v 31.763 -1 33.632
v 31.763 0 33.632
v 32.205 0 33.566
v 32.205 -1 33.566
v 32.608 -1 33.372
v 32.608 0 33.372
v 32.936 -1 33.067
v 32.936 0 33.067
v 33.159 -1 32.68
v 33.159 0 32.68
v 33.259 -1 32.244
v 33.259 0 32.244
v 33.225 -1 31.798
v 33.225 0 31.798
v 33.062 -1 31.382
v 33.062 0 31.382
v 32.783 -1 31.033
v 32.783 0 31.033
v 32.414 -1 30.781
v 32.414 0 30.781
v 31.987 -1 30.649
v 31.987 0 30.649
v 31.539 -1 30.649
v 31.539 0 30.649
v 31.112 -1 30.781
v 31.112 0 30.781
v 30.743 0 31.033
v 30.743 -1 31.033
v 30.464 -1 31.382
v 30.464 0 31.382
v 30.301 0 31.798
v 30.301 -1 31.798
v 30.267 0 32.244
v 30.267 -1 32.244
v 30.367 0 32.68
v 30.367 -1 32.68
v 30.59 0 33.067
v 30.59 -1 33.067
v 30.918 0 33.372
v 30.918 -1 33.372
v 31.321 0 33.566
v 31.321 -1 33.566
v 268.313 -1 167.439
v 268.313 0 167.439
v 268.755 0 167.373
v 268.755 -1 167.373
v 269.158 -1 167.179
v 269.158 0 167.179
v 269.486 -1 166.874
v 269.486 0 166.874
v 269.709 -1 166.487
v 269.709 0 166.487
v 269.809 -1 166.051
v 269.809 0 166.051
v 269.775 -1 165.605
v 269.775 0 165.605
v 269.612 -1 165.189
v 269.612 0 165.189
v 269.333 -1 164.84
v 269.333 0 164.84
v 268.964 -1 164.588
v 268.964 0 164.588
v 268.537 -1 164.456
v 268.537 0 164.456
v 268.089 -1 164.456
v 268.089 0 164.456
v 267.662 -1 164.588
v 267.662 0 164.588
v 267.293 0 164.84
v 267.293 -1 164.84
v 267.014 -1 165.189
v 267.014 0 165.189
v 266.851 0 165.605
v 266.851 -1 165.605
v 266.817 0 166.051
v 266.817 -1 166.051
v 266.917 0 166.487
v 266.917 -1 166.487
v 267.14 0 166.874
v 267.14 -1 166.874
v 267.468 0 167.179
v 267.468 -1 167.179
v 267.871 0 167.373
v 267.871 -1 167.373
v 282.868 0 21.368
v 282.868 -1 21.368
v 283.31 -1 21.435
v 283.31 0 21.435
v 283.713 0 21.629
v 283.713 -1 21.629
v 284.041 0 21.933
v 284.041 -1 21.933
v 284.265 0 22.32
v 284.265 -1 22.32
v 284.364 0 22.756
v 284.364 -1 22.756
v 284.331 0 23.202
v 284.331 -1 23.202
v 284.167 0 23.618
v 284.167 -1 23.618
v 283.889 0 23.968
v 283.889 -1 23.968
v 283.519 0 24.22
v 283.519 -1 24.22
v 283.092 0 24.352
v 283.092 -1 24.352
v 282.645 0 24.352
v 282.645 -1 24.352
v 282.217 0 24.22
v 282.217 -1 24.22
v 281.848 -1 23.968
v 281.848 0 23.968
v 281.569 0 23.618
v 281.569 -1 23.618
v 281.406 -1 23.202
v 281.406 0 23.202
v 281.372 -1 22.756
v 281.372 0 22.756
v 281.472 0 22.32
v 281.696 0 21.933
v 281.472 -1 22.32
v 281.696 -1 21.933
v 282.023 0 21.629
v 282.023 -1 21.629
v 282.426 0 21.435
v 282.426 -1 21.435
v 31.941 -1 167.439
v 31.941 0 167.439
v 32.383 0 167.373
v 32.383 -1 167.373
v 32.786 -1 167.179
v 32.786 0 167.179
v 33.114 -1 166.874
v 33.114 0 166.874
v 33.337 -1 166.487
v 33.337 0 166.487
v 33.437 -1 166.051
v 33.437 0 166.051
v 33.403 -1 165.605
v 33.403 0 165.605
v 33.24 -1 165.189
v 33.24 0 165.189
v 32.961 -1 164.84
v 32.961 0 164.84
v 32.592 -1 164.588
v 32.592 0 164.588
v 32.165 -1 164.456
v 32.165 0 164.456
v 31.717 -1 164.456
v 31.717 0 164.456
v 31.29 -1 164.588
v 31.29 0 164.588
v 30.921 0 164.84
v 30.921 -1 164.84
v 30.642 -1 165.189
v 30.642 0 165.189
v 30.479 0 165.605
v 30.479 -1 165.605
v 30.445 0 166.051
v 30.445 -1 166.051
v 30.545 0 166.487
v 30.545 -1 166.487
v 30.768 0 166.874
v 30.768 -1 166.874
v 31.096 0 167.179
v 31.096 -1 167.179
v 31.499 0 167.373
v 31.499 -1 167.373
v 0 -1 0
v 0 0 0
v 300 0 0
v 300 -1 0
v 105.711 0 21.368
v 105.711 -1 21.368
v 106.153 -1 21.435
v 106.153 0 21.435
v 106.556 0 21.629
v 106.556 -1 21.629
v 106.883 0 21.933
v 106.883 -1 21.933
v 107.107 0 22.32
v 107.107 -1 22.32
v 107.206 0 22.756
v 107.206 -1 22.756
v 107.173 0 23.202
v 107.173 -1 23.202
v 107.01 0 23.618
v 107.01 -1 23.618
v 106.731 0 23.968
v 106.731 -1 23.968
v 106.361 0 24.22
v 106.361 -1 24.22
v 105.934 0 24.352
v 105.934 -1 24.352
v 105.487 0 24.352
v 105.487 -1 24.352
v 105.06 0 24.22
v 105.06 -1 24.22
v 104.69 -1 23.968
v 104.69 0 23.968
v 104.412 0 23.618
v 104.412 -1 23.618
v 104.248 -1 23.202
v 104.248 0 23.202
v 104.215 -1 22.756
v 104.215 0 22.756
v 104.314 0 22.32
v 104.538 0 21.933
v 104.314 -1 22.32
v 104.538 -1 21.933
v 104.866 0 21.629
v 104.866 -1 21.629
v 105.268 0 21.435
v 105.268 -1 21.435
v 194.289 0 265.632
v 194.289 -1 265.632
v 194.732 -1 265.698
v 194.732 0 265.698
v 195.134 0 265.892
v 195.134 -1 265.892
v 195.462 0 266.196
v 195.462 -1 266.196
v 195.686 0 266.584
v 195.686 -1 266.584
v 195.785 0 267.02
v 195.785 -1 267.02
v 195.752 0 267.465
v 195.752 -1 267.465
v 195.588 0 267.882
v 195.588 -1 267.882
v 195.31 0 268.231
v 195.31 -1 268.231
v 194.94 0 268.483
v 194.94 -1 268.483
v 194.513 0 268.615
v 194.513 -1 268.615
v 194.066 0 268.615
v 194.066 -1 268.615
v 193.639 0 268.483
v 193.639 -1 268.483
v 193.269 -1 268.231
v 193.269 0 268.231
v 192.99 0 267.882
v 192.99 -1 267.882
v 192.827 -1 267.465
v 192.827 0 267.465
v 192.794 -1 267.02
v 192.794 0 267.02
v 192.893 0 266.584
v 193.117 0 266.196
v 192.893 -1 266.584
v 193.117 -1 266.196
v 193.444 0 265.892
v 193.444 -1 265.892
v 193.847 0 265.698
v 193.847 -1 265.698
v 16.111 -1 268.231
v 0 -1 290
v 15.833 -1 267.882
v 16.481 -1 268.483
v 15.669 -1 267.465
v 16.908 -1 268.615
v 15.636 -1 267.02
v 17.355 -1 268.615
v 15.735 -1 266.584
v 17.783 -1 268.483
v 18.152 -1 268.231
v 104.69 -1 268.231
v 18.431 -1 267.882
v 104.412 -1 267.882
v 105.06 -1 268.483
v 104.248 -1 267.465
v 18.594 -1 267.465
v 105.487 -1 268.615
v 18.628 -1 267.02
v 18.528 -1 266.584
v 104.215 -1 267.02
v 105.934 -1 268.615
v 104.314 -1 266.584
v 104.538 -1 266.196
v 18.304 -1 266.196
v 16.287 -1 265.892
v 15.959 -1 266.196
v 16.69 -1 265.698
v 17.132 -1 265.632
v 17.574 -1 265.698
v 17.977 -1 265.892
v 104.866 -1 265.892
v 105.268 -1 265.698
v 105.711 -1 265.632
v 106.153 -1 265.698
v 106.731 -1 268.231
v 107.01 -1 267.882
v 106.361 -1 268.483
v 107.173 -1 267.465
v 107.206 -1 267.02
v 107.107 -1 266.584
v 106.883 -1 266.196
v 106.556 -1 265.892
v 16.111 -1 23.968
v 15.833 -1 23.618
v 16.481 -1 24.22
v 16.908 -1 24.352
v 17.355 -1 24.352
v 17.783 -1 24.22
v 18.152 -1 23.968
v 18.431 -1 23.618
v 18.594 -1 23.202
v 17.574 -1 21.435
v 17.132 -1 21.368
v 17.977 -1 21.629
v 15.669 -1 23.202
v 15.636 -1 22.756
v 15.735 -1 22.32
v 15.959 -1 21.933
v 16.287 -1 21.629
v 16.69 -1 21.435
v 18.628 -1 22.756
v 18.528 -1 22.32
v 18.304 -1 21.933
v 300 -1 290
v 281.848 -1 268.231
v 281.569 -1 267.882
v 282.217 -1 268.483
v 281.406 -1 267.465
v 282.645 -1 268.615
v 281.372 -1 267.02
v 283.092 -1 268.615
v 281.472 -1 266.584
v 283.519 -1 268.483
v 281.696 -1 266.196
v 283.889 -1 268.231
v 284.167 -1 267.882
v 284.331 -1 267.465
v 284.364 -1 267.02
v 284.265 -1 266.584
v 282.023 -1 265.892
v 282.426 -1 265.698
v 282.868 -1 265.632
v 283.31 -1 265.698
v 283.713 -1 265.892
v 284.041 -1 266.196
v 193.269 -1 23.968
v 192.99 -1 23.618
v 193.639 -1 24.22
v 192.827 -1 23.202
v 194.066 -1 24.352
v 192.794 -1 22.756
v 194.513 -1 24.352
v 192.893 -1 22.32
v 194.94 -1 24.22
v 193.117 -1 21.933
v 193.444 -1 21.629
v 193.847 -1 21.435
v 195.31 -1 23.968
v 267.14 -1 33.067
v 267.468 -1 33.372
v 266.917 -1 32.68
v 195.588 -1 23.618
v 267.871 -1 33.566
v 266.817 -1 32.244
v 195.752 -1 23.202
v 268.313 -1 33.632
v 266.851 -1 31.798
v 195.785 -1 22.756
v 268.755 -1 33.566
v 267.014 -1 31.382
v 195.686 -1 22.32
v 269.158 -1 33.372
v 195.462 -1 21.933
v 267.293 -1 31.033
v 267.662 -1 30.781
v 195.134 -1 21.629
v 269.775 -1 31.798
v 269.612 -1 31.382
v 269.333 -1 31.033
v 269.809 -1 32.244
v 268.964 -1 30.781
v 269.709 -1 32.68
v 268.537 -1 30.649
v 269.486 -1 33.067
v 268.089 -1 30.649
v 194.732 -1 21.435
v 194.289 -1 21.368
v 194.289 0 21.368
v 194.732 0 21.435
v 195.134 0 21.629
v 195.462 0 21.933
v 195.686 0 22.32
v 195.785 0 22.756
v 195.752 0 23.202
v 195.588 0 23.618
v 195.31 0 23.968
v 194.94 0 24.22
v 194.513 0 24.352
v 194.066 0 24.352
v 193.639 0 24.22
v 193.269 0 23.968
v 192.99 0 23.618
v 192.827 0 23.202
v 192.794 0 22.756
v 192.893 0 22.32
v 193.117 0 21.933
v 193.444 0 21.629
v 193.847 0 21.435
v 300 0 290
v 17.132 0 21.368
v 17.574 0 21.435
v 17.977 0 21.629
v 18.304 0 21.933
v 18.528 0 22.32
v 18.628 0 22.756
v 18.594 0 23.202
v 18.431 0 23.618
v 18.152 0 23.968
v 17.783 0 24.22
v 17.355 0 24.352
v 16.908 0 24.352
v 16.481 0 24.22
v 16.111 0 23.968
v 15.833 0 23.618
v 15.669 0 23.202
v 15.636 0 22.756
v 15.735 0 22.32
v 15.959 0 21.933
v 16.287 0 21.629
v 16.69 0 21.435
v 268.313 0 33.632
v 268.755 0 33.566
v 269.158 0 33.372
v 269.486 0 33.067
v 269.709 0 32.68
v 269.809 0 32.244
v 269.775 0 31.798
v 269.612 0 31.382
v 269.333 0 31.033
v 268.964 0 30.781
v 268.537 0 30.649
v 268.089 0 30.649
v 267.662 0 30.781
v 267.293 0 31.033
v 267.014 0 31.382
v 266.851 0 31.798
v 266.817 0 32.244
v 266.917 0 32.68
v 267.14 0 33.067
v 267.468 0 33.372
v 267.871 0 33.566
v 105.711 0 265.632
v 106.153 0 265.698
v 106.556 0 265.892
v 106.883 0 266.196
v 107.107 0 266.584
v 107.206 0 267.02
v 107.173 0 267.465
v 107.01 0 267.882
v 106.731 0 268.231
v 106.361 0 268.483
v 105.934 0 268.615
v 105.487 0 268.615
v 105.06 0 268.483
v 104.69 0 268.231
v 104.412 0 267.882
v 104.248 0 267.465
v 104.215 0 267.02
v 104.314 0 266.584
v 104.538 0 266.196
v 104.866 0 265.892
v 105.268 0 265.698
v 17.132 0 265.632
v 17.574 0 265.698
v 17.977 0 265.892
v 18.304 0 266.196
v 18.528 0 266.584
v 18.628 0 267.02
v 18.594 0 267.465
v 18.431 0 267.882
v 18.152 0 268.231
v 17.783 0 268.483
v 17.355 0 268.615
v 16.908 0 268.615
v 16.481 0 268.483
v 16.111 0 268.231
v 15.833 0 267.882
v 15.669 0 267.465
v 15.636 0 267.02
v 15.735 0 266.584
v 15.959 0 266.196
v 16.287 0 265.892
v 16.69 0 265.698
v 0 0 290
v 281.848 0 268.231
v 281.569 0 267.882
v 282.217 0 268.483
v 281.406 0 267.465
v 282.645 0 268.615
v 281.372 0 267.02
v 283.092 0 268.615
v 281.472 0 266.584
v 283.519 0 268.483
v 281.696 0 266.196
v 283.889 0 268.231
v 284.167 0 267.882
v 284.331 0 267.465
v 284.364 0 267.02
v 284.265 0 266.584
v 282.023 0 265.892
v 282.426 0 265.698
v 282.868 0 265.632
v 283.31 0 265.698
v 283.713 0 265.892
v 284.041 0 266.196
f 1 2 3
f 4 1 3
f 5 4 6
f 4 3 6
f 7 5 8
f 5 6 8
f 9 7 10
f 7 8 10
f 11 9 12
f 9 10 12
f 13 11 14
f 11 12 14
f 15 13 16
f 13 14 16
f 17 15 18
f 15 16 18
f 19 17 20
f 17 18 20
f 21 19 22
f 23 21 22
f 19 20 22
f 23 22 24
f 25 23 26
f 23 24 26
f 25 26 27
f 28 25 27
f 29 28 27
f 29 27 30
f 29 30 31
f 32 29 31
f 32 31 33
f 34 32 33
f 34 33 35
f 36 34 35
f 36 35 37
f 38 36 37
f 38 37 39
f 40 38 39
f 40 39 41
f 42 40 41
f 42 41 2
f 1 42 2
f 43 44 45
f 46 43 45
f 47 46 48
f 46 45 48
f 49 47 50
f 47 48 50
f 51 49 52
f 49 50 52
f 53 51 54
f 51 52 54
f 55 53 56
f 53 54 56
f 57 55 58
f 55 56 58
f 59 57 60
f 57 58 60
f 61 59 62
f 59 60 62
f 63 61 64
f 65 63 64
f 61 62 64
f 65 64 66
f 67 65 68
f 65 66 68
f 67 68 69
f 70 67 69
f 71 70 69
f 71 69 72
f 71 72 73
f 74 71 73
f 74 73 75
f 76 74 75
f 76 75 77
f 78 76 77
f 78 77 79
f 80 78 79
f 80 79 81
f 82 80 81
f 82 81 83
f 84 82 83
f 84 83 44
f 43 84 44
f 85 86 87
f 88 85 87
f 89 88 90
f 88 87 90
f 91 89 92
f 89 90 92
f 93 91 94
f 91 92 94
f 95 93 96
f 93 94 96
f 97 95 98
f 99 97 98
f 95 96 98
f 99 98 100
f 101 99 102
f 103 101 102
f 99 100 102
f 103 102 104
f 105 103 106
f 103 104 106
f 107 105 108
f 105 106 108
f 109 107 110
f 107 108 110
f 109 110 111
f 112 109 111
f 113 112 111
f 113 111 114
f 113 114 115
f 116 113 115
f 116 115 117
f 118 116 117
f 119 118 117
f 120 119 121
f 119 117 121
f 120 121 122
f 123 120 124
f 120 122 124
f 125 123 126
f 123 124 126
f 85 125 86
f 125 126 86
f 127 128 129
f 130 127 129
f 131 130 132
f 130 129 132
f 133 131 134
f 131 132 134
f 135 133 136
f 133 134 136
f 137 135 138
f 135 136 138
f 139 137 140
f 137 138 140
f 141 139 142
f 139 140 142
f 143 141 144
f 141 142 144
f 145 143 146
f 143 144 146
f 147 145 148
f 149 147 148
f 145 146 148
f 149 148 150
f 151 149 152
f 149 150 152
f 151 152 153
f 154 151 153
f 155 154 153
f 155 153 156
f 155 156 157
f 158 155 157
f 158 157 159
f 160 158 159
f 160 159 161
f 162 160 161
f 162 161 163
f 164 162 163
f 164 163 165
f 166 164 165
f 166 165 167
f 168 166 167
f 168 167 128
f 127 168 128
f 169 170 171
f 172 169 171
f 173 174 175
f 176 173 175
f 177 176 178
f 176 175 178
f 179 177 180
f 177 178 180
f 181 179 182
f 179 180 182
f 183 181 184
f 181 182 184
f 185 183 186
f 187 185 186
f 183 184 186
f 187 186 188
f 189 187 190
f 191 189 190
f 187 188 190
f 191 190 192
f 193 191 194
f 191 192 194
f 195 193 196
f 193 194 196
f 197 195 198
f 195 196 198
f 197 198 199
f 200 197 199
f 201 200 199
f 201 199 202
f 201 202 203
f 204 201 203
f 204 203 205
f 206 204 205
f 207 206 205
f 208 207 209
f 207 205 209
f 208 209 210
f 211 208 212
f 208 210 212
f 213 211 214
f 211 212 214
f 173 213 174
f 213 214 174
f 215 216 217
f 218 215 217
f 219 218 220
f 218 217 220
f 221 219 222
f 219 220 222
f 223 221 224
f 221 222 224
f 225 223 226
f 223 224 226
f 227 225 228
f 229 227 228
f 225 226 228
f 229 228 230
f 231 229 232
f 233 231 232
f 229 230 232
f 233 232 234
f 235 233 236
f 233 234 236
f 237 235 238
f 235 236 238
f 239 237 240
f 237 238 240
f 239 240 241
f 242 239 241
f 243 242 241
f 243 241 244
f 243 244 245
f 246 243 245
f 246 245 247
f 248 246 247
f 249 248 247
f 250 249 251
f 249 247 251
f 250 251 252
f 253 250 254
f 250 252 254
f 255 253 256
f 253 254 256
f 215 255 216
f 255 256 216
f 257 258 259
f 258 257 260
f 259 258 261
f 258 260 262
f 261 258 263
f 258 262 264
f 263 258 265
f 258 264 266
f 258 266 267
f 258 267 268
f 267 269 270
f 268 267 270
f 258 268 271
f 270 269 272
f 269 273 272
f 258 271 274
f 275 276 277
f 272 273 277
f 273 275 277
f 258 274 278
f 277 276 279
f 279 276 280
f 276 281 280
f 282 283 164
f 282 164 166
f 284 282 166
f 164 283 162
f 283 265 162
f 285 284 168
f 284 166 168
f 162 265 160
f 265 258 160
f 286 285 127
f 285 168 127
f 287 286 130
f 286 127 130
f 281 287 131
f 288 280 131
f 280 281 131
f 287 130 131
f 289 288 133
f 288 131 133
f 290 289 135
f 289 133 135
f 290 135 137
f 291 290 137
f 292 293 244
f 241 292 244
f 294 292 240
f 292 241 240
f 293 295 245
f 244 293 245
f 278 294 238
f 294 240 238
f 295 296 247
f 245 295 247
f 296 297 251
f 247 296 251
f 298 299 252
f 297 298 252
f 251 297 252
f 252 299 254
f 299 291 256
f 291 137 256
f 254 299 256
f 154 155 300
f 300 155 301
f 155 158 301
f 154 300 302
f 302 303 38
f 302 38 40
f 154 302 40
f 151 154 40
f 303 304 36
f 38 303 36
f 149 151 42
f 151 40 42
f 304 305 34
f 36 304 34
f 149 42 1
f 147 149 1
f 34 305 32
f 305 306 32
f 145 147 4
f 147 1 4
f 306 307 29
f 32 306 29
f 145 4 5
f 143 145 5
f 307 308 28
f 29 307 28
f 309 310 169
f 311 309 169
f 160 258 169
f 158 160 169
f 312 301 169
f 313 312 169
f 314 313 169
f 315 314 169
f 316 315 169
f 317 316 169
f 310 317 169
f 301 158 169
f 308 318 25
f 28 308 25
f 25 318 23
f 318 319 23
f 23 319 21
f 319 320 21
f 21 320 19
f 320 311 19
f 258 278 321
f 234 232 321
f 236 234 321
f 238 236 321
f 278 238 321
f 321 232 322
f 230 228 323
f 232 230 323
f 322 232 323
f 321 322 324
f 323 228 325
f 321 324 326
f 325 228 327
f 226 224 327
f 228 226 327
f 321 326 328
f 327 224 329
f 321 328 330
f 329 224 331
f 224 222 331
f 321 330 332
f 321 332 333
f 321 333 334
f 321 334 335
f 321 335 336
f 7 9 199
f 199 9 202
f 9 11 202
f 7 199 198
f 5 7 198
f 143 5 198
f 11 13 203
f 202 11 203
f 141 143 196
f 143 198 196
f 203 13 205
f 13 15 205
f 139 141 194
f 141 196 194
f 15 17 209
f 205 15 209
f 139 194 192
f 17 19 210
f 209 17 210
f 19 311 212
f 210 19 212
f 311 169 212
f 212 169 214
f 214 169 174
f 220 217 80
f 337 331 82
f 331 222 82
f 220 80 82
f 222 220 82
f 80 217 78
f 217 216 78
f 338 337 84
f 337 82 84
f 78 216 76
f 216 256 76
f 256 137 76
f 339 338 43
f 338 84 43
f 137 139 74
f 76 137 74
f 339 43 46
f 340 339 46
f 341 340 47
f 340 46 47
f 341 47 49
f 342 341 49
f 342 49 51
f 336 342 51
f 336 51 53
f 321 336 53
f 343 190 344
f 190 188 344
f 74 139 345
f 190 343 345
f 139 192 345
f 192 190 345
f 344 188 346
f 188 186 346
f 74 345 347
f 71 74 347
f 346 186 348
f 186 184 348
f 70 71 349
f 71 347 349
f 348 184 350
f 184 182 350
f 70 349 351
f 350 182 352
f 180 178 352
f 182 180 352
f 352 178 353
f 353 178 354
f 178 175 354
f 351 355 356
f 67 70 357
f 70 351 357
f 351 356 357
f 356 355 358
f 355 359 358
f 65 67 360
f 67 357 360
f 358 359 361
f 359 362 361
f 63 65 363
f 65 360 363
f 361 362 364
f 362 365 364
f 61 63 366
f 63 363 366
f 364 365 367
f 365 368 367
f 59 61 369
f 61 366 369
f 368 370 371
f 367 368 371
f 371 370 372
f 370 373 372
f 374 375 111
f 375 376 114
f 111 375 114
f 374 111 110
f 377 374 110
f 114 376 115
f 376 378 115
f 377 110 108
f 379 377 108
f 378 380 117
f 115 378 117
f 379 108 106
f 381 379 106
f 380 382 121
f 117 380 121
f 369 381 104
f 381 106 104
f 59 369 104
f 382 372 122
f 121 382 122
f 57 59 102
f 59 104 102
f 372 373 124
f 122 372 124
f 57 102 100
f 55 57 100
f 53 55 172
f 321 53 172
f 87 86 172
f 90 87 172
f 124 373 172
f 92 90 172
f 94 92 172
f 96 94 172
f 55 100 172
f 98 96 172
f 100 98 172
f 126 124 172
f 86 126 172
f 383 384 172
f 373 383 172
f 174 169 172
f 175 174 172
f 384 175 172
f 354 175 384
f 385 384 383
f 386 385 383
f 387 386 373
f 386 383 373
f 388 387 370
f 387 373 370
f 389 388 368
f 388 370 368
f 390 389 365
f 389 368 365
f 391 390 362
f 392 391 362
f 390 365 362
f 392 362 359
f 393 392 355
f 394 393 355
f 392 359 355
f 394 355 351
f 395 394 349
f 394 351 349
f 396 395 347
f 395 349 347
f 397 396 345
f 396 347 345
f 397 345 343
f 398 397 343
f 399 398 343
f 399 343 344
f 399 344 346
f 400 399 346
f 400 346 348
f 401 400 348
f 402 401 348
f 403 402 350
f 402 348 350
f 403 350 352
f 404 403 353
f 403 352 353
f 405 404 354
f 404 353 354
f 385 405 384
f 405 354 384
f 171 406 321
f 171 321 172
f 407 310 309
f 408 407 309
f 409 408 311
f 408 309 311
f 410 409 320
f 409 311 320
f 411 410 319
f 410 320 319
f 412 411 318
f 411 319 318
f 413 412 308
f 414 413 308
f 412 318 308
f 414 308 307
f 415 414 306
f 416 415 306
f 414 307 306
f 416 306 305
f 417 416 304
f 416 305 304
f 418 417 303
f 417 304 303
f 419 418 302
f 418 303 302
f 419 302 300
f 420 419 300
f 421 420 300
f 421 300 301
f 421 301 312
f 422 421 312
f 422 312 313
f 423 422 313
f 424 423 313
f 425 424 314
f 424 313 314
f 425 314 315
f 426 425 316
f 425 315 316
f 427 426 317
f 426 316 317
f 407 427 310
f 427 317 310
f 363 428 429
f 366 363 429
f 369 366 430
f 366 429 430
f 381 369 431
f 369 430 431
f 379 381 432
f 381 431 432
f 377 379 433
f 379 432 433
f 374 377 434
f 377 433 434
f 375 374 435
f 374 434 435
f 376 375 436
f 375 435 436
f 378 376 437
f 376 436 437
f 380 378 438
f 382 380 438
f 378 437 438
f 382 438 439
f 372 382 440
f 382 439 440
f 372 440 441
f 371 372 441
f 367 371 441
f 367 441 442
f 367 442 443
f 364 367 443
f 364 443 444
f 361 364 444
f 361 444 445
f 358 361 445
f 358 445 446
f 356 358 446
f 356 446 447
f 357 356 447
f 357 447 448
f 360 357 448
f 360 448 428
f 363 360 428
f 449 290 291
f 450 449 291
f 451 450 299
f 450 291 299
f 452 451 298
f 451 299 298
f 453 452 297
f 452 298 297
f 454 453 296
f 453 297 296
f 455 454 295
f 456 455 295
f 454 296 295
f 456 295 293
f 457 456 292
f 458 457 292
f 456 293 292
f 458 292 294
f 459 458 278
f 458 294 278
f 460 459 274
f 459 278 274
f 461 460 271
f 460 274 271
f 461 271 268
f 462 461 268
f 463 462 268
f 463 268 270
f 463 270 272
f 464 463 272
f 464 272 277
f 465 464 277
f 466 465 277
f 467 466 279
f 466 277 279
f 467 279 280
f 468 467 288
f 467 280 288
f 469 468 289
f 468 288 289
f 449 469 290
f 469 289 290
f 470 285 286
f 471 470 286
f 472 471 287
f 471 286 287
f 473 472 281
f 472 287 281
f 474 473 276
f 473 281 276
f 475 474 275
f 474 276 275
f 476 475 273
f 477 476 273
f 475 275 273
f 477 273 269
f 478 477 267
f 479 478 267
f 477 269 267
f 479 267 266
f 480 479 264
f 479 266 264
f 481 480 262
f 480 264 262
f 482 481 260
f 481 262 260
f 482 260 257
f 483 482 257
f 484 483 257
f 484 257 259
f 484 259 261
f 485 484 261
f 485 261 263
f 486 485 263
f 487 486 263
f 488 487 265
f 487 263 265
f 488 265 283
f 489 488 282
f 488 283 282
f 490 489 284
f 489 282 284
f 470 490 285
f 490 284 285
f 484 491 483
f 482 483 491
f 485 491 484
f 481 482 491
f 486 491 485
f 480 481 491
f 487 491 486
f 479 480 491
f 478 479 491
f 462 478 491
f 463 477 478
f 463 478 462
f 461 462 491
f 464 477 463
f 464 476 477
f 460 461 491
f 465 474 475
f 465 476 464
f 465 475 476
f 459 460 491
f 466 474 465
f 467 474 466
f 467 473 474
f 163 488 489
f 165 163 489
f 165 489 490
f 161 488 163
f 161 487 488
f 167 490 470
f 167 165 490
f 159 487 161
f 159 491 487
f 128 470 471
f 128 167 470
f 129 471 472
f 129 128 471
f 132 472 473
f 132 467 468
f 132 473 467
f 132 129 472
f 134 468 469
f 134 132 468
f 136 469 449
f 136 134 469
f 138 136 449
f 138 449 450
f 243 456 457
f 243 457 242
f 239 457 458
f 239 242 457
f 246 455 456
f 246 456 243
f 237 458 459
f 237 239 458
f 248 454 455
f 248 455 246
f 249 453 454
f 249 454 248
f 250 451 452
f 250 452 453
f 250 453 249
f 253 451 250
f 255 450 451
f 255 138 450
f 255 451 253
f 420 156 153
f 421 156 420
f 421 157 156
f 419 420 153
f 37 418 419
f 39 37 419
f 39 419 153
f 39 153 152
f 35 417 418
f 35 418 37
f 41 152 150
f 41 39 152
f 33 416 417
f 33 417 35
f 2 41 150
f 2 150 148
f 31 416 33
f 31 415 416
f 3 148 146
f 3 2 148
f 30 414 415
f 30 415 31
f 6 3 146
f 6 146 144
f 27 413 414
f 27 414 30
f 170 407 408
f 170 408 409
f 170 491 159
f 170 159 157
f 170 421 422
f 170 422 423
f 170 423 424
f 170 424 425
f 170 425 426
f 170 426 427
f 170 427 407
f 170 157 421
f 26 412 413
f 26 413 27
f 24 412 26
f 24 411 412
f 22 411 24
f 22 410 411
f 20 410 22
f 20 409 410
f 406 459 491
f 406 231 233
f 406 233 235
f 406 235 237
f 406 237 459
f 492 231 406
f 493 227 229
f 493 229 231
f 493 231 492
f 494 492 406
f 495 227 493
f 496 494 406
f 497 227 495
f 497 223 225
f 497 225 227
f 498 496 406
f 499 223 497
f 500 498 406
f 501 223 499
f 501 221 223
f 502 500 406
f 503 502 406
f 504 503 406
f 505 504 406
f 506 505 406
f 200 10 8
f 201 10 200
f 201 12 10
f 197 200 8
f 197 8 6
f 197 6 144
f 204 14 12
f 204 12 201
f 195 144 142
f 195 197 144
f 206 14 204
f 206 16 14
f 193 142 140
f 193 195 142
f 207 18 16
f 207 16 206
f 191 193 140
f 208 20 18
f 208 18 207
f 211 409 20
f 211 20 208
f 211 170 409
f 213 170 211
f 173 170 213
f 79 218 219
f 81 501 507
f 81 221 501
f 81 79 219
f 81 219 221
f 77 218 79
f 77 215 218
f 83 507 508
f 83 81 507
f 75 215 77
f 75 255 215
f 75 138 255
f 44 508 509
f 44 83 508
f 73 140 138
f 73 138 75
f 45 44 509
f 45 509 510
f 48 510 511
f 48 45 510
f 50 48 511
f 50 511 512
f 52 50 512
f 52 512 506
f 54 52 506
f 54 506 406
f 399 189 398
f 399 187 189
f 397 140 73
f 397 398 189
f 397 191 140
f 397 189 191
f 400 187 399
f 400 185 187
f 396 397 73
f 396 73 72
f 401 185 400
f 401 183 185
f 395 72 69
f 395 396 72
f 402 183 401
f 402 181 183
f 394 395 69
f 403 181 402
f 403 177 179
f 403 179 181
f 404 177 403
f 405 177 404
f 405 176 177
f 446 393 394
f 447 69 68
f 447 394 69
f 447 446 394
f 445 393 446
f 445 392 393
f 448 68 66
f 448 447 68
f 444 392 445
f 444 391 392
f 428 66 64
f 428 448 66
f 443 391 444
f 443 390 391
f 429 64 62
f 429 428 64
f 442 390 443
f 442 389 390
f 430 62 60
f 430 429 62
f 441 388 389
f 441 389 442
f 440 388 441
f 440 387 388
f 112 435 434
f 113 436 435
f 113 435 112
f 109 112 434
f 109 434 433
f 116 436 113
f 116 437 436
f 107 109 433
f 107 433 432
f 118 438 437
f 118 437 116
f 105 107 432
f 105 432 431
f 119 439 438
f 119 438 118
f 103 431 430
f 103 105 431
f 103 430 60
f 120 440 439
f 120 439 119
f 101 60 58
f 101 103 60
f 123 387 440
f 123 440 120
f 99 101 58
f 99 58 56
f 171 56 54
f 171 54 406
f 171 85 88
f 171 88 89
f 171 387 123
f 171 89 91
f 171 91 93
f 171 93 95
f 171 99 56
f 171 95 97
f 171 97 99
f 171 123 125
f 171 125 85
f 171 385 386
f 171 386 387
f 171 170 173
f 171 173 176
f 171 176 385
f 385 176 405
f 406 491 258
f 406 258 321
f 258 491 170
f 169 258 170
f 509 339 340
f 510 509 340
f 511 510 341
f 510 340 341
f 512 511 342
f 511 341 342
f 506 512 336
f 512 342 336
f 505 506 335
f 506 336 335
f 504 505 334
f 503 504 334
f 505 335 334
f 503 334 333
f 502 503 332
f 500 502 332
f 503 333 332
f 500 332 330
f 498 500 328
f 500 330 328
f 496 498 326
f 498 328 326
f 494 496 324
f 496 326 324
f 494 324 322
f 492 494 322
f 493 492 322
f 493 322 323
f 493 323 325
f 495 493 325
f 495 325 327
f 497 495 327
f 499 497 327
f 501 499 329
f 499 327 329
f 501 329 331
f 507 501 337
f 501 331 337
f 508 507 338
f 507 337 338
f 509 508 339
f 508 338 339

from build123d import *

# Parameters (mm, degrees)
SKETCH1_W          = 300
SKETCH1_H          = 290
BASE_FLANGE1_DEPTH = 1
SKETCH7_R          = 1.5
CUT_EXTRUDE1_DEPTH = 1
SKETCH9_R          = 1.5
CUT_EXTRUDE3_DEPTH = 418.254119213


# Sheet-metal steps are written as plain solids
with BuildPart() as part:
    # Sketch1 → Base-Flange1 (new body)
    with BuildSketch(Plane(origin=(0, 0, 0), x_dir=(1, 0, 0), z_dir=(0, 1, 0))):
        with Locations((150, -145)):
            Rectangle(SKETCH1_W, SKETCH1_H)
    extrude(amount=-BASE_FLANGE1_DEPTH)

    # Sketch7 → Cut-Extrude1 (cut)
    with BuildSketch(Plane.XZ.offset(1)):
        with Locations(Location((17.1317, 267.1317, 0), (0, 0, 270))):
            Circle(SKETCH7_R)
        with Locations(Location((105.710566667, 267.1317, 0), (0, 0, 270))):
            Circle(SKETCH7_R)
        with Locations(Location((194.289433333, 267.1317, 0), (0, 0, 270))):
            Circle(SKETCH7_R)
        with Locations(Location((282.8683, 267.1317, 0), (0, 0, 270))):
            Circle(SKETCH7_R)
        with Locations(Location((282.8683, 22.8683, 0), (0, 0, 270))):
            Circle(SKETCH7_R)
        with Locations(Location((194.289433333, 22.8683, 0), (0, 0, 270))):
            Circle(SKETCH7_R)
        with Locations(Location((105.710566667, 22.8683, 0), (0, 0, 270))):
            Circle(SKETCH7_R)
        with Locations(Location((17.1317, 22.8683, 0), (0, 0, 270))):
            Circle(SKETCH7_R)
    extrude(amount=-CUT_EXTRUDE1_DEPTH, mode=Mode.SUBTRACT)

    # Sketch9 → Cut-Extrude3 (cut, through all)
    with BuildSketch(Plane(origin=(0, 0, 0), x_dir=(1, 0, 0), z_dir=(0, 1, 0))):
        with Locations(Location((31.763, -32.132248658, 0), (0, 0, 270))):
            Circle(SKETCH9_R)
        with Locations(Location((31.941, -165.939248658, 0), (0, 0, 270))):
            Circle(SKETCH9_R)
        with Locations(Location((268.313, -165.939248658, 0), (0, 0, 270))):
            Circle(SKETCH9_R)
        with Locations(Location((268.313, -32.132248658, 0), (0, 0, 270))):
            Circle(SKETCH9_R)
    extrude(amount=-CUT_EXTRUDE3_DEPTH, mode=Mode.SUBTRACT)


solid = part.part
